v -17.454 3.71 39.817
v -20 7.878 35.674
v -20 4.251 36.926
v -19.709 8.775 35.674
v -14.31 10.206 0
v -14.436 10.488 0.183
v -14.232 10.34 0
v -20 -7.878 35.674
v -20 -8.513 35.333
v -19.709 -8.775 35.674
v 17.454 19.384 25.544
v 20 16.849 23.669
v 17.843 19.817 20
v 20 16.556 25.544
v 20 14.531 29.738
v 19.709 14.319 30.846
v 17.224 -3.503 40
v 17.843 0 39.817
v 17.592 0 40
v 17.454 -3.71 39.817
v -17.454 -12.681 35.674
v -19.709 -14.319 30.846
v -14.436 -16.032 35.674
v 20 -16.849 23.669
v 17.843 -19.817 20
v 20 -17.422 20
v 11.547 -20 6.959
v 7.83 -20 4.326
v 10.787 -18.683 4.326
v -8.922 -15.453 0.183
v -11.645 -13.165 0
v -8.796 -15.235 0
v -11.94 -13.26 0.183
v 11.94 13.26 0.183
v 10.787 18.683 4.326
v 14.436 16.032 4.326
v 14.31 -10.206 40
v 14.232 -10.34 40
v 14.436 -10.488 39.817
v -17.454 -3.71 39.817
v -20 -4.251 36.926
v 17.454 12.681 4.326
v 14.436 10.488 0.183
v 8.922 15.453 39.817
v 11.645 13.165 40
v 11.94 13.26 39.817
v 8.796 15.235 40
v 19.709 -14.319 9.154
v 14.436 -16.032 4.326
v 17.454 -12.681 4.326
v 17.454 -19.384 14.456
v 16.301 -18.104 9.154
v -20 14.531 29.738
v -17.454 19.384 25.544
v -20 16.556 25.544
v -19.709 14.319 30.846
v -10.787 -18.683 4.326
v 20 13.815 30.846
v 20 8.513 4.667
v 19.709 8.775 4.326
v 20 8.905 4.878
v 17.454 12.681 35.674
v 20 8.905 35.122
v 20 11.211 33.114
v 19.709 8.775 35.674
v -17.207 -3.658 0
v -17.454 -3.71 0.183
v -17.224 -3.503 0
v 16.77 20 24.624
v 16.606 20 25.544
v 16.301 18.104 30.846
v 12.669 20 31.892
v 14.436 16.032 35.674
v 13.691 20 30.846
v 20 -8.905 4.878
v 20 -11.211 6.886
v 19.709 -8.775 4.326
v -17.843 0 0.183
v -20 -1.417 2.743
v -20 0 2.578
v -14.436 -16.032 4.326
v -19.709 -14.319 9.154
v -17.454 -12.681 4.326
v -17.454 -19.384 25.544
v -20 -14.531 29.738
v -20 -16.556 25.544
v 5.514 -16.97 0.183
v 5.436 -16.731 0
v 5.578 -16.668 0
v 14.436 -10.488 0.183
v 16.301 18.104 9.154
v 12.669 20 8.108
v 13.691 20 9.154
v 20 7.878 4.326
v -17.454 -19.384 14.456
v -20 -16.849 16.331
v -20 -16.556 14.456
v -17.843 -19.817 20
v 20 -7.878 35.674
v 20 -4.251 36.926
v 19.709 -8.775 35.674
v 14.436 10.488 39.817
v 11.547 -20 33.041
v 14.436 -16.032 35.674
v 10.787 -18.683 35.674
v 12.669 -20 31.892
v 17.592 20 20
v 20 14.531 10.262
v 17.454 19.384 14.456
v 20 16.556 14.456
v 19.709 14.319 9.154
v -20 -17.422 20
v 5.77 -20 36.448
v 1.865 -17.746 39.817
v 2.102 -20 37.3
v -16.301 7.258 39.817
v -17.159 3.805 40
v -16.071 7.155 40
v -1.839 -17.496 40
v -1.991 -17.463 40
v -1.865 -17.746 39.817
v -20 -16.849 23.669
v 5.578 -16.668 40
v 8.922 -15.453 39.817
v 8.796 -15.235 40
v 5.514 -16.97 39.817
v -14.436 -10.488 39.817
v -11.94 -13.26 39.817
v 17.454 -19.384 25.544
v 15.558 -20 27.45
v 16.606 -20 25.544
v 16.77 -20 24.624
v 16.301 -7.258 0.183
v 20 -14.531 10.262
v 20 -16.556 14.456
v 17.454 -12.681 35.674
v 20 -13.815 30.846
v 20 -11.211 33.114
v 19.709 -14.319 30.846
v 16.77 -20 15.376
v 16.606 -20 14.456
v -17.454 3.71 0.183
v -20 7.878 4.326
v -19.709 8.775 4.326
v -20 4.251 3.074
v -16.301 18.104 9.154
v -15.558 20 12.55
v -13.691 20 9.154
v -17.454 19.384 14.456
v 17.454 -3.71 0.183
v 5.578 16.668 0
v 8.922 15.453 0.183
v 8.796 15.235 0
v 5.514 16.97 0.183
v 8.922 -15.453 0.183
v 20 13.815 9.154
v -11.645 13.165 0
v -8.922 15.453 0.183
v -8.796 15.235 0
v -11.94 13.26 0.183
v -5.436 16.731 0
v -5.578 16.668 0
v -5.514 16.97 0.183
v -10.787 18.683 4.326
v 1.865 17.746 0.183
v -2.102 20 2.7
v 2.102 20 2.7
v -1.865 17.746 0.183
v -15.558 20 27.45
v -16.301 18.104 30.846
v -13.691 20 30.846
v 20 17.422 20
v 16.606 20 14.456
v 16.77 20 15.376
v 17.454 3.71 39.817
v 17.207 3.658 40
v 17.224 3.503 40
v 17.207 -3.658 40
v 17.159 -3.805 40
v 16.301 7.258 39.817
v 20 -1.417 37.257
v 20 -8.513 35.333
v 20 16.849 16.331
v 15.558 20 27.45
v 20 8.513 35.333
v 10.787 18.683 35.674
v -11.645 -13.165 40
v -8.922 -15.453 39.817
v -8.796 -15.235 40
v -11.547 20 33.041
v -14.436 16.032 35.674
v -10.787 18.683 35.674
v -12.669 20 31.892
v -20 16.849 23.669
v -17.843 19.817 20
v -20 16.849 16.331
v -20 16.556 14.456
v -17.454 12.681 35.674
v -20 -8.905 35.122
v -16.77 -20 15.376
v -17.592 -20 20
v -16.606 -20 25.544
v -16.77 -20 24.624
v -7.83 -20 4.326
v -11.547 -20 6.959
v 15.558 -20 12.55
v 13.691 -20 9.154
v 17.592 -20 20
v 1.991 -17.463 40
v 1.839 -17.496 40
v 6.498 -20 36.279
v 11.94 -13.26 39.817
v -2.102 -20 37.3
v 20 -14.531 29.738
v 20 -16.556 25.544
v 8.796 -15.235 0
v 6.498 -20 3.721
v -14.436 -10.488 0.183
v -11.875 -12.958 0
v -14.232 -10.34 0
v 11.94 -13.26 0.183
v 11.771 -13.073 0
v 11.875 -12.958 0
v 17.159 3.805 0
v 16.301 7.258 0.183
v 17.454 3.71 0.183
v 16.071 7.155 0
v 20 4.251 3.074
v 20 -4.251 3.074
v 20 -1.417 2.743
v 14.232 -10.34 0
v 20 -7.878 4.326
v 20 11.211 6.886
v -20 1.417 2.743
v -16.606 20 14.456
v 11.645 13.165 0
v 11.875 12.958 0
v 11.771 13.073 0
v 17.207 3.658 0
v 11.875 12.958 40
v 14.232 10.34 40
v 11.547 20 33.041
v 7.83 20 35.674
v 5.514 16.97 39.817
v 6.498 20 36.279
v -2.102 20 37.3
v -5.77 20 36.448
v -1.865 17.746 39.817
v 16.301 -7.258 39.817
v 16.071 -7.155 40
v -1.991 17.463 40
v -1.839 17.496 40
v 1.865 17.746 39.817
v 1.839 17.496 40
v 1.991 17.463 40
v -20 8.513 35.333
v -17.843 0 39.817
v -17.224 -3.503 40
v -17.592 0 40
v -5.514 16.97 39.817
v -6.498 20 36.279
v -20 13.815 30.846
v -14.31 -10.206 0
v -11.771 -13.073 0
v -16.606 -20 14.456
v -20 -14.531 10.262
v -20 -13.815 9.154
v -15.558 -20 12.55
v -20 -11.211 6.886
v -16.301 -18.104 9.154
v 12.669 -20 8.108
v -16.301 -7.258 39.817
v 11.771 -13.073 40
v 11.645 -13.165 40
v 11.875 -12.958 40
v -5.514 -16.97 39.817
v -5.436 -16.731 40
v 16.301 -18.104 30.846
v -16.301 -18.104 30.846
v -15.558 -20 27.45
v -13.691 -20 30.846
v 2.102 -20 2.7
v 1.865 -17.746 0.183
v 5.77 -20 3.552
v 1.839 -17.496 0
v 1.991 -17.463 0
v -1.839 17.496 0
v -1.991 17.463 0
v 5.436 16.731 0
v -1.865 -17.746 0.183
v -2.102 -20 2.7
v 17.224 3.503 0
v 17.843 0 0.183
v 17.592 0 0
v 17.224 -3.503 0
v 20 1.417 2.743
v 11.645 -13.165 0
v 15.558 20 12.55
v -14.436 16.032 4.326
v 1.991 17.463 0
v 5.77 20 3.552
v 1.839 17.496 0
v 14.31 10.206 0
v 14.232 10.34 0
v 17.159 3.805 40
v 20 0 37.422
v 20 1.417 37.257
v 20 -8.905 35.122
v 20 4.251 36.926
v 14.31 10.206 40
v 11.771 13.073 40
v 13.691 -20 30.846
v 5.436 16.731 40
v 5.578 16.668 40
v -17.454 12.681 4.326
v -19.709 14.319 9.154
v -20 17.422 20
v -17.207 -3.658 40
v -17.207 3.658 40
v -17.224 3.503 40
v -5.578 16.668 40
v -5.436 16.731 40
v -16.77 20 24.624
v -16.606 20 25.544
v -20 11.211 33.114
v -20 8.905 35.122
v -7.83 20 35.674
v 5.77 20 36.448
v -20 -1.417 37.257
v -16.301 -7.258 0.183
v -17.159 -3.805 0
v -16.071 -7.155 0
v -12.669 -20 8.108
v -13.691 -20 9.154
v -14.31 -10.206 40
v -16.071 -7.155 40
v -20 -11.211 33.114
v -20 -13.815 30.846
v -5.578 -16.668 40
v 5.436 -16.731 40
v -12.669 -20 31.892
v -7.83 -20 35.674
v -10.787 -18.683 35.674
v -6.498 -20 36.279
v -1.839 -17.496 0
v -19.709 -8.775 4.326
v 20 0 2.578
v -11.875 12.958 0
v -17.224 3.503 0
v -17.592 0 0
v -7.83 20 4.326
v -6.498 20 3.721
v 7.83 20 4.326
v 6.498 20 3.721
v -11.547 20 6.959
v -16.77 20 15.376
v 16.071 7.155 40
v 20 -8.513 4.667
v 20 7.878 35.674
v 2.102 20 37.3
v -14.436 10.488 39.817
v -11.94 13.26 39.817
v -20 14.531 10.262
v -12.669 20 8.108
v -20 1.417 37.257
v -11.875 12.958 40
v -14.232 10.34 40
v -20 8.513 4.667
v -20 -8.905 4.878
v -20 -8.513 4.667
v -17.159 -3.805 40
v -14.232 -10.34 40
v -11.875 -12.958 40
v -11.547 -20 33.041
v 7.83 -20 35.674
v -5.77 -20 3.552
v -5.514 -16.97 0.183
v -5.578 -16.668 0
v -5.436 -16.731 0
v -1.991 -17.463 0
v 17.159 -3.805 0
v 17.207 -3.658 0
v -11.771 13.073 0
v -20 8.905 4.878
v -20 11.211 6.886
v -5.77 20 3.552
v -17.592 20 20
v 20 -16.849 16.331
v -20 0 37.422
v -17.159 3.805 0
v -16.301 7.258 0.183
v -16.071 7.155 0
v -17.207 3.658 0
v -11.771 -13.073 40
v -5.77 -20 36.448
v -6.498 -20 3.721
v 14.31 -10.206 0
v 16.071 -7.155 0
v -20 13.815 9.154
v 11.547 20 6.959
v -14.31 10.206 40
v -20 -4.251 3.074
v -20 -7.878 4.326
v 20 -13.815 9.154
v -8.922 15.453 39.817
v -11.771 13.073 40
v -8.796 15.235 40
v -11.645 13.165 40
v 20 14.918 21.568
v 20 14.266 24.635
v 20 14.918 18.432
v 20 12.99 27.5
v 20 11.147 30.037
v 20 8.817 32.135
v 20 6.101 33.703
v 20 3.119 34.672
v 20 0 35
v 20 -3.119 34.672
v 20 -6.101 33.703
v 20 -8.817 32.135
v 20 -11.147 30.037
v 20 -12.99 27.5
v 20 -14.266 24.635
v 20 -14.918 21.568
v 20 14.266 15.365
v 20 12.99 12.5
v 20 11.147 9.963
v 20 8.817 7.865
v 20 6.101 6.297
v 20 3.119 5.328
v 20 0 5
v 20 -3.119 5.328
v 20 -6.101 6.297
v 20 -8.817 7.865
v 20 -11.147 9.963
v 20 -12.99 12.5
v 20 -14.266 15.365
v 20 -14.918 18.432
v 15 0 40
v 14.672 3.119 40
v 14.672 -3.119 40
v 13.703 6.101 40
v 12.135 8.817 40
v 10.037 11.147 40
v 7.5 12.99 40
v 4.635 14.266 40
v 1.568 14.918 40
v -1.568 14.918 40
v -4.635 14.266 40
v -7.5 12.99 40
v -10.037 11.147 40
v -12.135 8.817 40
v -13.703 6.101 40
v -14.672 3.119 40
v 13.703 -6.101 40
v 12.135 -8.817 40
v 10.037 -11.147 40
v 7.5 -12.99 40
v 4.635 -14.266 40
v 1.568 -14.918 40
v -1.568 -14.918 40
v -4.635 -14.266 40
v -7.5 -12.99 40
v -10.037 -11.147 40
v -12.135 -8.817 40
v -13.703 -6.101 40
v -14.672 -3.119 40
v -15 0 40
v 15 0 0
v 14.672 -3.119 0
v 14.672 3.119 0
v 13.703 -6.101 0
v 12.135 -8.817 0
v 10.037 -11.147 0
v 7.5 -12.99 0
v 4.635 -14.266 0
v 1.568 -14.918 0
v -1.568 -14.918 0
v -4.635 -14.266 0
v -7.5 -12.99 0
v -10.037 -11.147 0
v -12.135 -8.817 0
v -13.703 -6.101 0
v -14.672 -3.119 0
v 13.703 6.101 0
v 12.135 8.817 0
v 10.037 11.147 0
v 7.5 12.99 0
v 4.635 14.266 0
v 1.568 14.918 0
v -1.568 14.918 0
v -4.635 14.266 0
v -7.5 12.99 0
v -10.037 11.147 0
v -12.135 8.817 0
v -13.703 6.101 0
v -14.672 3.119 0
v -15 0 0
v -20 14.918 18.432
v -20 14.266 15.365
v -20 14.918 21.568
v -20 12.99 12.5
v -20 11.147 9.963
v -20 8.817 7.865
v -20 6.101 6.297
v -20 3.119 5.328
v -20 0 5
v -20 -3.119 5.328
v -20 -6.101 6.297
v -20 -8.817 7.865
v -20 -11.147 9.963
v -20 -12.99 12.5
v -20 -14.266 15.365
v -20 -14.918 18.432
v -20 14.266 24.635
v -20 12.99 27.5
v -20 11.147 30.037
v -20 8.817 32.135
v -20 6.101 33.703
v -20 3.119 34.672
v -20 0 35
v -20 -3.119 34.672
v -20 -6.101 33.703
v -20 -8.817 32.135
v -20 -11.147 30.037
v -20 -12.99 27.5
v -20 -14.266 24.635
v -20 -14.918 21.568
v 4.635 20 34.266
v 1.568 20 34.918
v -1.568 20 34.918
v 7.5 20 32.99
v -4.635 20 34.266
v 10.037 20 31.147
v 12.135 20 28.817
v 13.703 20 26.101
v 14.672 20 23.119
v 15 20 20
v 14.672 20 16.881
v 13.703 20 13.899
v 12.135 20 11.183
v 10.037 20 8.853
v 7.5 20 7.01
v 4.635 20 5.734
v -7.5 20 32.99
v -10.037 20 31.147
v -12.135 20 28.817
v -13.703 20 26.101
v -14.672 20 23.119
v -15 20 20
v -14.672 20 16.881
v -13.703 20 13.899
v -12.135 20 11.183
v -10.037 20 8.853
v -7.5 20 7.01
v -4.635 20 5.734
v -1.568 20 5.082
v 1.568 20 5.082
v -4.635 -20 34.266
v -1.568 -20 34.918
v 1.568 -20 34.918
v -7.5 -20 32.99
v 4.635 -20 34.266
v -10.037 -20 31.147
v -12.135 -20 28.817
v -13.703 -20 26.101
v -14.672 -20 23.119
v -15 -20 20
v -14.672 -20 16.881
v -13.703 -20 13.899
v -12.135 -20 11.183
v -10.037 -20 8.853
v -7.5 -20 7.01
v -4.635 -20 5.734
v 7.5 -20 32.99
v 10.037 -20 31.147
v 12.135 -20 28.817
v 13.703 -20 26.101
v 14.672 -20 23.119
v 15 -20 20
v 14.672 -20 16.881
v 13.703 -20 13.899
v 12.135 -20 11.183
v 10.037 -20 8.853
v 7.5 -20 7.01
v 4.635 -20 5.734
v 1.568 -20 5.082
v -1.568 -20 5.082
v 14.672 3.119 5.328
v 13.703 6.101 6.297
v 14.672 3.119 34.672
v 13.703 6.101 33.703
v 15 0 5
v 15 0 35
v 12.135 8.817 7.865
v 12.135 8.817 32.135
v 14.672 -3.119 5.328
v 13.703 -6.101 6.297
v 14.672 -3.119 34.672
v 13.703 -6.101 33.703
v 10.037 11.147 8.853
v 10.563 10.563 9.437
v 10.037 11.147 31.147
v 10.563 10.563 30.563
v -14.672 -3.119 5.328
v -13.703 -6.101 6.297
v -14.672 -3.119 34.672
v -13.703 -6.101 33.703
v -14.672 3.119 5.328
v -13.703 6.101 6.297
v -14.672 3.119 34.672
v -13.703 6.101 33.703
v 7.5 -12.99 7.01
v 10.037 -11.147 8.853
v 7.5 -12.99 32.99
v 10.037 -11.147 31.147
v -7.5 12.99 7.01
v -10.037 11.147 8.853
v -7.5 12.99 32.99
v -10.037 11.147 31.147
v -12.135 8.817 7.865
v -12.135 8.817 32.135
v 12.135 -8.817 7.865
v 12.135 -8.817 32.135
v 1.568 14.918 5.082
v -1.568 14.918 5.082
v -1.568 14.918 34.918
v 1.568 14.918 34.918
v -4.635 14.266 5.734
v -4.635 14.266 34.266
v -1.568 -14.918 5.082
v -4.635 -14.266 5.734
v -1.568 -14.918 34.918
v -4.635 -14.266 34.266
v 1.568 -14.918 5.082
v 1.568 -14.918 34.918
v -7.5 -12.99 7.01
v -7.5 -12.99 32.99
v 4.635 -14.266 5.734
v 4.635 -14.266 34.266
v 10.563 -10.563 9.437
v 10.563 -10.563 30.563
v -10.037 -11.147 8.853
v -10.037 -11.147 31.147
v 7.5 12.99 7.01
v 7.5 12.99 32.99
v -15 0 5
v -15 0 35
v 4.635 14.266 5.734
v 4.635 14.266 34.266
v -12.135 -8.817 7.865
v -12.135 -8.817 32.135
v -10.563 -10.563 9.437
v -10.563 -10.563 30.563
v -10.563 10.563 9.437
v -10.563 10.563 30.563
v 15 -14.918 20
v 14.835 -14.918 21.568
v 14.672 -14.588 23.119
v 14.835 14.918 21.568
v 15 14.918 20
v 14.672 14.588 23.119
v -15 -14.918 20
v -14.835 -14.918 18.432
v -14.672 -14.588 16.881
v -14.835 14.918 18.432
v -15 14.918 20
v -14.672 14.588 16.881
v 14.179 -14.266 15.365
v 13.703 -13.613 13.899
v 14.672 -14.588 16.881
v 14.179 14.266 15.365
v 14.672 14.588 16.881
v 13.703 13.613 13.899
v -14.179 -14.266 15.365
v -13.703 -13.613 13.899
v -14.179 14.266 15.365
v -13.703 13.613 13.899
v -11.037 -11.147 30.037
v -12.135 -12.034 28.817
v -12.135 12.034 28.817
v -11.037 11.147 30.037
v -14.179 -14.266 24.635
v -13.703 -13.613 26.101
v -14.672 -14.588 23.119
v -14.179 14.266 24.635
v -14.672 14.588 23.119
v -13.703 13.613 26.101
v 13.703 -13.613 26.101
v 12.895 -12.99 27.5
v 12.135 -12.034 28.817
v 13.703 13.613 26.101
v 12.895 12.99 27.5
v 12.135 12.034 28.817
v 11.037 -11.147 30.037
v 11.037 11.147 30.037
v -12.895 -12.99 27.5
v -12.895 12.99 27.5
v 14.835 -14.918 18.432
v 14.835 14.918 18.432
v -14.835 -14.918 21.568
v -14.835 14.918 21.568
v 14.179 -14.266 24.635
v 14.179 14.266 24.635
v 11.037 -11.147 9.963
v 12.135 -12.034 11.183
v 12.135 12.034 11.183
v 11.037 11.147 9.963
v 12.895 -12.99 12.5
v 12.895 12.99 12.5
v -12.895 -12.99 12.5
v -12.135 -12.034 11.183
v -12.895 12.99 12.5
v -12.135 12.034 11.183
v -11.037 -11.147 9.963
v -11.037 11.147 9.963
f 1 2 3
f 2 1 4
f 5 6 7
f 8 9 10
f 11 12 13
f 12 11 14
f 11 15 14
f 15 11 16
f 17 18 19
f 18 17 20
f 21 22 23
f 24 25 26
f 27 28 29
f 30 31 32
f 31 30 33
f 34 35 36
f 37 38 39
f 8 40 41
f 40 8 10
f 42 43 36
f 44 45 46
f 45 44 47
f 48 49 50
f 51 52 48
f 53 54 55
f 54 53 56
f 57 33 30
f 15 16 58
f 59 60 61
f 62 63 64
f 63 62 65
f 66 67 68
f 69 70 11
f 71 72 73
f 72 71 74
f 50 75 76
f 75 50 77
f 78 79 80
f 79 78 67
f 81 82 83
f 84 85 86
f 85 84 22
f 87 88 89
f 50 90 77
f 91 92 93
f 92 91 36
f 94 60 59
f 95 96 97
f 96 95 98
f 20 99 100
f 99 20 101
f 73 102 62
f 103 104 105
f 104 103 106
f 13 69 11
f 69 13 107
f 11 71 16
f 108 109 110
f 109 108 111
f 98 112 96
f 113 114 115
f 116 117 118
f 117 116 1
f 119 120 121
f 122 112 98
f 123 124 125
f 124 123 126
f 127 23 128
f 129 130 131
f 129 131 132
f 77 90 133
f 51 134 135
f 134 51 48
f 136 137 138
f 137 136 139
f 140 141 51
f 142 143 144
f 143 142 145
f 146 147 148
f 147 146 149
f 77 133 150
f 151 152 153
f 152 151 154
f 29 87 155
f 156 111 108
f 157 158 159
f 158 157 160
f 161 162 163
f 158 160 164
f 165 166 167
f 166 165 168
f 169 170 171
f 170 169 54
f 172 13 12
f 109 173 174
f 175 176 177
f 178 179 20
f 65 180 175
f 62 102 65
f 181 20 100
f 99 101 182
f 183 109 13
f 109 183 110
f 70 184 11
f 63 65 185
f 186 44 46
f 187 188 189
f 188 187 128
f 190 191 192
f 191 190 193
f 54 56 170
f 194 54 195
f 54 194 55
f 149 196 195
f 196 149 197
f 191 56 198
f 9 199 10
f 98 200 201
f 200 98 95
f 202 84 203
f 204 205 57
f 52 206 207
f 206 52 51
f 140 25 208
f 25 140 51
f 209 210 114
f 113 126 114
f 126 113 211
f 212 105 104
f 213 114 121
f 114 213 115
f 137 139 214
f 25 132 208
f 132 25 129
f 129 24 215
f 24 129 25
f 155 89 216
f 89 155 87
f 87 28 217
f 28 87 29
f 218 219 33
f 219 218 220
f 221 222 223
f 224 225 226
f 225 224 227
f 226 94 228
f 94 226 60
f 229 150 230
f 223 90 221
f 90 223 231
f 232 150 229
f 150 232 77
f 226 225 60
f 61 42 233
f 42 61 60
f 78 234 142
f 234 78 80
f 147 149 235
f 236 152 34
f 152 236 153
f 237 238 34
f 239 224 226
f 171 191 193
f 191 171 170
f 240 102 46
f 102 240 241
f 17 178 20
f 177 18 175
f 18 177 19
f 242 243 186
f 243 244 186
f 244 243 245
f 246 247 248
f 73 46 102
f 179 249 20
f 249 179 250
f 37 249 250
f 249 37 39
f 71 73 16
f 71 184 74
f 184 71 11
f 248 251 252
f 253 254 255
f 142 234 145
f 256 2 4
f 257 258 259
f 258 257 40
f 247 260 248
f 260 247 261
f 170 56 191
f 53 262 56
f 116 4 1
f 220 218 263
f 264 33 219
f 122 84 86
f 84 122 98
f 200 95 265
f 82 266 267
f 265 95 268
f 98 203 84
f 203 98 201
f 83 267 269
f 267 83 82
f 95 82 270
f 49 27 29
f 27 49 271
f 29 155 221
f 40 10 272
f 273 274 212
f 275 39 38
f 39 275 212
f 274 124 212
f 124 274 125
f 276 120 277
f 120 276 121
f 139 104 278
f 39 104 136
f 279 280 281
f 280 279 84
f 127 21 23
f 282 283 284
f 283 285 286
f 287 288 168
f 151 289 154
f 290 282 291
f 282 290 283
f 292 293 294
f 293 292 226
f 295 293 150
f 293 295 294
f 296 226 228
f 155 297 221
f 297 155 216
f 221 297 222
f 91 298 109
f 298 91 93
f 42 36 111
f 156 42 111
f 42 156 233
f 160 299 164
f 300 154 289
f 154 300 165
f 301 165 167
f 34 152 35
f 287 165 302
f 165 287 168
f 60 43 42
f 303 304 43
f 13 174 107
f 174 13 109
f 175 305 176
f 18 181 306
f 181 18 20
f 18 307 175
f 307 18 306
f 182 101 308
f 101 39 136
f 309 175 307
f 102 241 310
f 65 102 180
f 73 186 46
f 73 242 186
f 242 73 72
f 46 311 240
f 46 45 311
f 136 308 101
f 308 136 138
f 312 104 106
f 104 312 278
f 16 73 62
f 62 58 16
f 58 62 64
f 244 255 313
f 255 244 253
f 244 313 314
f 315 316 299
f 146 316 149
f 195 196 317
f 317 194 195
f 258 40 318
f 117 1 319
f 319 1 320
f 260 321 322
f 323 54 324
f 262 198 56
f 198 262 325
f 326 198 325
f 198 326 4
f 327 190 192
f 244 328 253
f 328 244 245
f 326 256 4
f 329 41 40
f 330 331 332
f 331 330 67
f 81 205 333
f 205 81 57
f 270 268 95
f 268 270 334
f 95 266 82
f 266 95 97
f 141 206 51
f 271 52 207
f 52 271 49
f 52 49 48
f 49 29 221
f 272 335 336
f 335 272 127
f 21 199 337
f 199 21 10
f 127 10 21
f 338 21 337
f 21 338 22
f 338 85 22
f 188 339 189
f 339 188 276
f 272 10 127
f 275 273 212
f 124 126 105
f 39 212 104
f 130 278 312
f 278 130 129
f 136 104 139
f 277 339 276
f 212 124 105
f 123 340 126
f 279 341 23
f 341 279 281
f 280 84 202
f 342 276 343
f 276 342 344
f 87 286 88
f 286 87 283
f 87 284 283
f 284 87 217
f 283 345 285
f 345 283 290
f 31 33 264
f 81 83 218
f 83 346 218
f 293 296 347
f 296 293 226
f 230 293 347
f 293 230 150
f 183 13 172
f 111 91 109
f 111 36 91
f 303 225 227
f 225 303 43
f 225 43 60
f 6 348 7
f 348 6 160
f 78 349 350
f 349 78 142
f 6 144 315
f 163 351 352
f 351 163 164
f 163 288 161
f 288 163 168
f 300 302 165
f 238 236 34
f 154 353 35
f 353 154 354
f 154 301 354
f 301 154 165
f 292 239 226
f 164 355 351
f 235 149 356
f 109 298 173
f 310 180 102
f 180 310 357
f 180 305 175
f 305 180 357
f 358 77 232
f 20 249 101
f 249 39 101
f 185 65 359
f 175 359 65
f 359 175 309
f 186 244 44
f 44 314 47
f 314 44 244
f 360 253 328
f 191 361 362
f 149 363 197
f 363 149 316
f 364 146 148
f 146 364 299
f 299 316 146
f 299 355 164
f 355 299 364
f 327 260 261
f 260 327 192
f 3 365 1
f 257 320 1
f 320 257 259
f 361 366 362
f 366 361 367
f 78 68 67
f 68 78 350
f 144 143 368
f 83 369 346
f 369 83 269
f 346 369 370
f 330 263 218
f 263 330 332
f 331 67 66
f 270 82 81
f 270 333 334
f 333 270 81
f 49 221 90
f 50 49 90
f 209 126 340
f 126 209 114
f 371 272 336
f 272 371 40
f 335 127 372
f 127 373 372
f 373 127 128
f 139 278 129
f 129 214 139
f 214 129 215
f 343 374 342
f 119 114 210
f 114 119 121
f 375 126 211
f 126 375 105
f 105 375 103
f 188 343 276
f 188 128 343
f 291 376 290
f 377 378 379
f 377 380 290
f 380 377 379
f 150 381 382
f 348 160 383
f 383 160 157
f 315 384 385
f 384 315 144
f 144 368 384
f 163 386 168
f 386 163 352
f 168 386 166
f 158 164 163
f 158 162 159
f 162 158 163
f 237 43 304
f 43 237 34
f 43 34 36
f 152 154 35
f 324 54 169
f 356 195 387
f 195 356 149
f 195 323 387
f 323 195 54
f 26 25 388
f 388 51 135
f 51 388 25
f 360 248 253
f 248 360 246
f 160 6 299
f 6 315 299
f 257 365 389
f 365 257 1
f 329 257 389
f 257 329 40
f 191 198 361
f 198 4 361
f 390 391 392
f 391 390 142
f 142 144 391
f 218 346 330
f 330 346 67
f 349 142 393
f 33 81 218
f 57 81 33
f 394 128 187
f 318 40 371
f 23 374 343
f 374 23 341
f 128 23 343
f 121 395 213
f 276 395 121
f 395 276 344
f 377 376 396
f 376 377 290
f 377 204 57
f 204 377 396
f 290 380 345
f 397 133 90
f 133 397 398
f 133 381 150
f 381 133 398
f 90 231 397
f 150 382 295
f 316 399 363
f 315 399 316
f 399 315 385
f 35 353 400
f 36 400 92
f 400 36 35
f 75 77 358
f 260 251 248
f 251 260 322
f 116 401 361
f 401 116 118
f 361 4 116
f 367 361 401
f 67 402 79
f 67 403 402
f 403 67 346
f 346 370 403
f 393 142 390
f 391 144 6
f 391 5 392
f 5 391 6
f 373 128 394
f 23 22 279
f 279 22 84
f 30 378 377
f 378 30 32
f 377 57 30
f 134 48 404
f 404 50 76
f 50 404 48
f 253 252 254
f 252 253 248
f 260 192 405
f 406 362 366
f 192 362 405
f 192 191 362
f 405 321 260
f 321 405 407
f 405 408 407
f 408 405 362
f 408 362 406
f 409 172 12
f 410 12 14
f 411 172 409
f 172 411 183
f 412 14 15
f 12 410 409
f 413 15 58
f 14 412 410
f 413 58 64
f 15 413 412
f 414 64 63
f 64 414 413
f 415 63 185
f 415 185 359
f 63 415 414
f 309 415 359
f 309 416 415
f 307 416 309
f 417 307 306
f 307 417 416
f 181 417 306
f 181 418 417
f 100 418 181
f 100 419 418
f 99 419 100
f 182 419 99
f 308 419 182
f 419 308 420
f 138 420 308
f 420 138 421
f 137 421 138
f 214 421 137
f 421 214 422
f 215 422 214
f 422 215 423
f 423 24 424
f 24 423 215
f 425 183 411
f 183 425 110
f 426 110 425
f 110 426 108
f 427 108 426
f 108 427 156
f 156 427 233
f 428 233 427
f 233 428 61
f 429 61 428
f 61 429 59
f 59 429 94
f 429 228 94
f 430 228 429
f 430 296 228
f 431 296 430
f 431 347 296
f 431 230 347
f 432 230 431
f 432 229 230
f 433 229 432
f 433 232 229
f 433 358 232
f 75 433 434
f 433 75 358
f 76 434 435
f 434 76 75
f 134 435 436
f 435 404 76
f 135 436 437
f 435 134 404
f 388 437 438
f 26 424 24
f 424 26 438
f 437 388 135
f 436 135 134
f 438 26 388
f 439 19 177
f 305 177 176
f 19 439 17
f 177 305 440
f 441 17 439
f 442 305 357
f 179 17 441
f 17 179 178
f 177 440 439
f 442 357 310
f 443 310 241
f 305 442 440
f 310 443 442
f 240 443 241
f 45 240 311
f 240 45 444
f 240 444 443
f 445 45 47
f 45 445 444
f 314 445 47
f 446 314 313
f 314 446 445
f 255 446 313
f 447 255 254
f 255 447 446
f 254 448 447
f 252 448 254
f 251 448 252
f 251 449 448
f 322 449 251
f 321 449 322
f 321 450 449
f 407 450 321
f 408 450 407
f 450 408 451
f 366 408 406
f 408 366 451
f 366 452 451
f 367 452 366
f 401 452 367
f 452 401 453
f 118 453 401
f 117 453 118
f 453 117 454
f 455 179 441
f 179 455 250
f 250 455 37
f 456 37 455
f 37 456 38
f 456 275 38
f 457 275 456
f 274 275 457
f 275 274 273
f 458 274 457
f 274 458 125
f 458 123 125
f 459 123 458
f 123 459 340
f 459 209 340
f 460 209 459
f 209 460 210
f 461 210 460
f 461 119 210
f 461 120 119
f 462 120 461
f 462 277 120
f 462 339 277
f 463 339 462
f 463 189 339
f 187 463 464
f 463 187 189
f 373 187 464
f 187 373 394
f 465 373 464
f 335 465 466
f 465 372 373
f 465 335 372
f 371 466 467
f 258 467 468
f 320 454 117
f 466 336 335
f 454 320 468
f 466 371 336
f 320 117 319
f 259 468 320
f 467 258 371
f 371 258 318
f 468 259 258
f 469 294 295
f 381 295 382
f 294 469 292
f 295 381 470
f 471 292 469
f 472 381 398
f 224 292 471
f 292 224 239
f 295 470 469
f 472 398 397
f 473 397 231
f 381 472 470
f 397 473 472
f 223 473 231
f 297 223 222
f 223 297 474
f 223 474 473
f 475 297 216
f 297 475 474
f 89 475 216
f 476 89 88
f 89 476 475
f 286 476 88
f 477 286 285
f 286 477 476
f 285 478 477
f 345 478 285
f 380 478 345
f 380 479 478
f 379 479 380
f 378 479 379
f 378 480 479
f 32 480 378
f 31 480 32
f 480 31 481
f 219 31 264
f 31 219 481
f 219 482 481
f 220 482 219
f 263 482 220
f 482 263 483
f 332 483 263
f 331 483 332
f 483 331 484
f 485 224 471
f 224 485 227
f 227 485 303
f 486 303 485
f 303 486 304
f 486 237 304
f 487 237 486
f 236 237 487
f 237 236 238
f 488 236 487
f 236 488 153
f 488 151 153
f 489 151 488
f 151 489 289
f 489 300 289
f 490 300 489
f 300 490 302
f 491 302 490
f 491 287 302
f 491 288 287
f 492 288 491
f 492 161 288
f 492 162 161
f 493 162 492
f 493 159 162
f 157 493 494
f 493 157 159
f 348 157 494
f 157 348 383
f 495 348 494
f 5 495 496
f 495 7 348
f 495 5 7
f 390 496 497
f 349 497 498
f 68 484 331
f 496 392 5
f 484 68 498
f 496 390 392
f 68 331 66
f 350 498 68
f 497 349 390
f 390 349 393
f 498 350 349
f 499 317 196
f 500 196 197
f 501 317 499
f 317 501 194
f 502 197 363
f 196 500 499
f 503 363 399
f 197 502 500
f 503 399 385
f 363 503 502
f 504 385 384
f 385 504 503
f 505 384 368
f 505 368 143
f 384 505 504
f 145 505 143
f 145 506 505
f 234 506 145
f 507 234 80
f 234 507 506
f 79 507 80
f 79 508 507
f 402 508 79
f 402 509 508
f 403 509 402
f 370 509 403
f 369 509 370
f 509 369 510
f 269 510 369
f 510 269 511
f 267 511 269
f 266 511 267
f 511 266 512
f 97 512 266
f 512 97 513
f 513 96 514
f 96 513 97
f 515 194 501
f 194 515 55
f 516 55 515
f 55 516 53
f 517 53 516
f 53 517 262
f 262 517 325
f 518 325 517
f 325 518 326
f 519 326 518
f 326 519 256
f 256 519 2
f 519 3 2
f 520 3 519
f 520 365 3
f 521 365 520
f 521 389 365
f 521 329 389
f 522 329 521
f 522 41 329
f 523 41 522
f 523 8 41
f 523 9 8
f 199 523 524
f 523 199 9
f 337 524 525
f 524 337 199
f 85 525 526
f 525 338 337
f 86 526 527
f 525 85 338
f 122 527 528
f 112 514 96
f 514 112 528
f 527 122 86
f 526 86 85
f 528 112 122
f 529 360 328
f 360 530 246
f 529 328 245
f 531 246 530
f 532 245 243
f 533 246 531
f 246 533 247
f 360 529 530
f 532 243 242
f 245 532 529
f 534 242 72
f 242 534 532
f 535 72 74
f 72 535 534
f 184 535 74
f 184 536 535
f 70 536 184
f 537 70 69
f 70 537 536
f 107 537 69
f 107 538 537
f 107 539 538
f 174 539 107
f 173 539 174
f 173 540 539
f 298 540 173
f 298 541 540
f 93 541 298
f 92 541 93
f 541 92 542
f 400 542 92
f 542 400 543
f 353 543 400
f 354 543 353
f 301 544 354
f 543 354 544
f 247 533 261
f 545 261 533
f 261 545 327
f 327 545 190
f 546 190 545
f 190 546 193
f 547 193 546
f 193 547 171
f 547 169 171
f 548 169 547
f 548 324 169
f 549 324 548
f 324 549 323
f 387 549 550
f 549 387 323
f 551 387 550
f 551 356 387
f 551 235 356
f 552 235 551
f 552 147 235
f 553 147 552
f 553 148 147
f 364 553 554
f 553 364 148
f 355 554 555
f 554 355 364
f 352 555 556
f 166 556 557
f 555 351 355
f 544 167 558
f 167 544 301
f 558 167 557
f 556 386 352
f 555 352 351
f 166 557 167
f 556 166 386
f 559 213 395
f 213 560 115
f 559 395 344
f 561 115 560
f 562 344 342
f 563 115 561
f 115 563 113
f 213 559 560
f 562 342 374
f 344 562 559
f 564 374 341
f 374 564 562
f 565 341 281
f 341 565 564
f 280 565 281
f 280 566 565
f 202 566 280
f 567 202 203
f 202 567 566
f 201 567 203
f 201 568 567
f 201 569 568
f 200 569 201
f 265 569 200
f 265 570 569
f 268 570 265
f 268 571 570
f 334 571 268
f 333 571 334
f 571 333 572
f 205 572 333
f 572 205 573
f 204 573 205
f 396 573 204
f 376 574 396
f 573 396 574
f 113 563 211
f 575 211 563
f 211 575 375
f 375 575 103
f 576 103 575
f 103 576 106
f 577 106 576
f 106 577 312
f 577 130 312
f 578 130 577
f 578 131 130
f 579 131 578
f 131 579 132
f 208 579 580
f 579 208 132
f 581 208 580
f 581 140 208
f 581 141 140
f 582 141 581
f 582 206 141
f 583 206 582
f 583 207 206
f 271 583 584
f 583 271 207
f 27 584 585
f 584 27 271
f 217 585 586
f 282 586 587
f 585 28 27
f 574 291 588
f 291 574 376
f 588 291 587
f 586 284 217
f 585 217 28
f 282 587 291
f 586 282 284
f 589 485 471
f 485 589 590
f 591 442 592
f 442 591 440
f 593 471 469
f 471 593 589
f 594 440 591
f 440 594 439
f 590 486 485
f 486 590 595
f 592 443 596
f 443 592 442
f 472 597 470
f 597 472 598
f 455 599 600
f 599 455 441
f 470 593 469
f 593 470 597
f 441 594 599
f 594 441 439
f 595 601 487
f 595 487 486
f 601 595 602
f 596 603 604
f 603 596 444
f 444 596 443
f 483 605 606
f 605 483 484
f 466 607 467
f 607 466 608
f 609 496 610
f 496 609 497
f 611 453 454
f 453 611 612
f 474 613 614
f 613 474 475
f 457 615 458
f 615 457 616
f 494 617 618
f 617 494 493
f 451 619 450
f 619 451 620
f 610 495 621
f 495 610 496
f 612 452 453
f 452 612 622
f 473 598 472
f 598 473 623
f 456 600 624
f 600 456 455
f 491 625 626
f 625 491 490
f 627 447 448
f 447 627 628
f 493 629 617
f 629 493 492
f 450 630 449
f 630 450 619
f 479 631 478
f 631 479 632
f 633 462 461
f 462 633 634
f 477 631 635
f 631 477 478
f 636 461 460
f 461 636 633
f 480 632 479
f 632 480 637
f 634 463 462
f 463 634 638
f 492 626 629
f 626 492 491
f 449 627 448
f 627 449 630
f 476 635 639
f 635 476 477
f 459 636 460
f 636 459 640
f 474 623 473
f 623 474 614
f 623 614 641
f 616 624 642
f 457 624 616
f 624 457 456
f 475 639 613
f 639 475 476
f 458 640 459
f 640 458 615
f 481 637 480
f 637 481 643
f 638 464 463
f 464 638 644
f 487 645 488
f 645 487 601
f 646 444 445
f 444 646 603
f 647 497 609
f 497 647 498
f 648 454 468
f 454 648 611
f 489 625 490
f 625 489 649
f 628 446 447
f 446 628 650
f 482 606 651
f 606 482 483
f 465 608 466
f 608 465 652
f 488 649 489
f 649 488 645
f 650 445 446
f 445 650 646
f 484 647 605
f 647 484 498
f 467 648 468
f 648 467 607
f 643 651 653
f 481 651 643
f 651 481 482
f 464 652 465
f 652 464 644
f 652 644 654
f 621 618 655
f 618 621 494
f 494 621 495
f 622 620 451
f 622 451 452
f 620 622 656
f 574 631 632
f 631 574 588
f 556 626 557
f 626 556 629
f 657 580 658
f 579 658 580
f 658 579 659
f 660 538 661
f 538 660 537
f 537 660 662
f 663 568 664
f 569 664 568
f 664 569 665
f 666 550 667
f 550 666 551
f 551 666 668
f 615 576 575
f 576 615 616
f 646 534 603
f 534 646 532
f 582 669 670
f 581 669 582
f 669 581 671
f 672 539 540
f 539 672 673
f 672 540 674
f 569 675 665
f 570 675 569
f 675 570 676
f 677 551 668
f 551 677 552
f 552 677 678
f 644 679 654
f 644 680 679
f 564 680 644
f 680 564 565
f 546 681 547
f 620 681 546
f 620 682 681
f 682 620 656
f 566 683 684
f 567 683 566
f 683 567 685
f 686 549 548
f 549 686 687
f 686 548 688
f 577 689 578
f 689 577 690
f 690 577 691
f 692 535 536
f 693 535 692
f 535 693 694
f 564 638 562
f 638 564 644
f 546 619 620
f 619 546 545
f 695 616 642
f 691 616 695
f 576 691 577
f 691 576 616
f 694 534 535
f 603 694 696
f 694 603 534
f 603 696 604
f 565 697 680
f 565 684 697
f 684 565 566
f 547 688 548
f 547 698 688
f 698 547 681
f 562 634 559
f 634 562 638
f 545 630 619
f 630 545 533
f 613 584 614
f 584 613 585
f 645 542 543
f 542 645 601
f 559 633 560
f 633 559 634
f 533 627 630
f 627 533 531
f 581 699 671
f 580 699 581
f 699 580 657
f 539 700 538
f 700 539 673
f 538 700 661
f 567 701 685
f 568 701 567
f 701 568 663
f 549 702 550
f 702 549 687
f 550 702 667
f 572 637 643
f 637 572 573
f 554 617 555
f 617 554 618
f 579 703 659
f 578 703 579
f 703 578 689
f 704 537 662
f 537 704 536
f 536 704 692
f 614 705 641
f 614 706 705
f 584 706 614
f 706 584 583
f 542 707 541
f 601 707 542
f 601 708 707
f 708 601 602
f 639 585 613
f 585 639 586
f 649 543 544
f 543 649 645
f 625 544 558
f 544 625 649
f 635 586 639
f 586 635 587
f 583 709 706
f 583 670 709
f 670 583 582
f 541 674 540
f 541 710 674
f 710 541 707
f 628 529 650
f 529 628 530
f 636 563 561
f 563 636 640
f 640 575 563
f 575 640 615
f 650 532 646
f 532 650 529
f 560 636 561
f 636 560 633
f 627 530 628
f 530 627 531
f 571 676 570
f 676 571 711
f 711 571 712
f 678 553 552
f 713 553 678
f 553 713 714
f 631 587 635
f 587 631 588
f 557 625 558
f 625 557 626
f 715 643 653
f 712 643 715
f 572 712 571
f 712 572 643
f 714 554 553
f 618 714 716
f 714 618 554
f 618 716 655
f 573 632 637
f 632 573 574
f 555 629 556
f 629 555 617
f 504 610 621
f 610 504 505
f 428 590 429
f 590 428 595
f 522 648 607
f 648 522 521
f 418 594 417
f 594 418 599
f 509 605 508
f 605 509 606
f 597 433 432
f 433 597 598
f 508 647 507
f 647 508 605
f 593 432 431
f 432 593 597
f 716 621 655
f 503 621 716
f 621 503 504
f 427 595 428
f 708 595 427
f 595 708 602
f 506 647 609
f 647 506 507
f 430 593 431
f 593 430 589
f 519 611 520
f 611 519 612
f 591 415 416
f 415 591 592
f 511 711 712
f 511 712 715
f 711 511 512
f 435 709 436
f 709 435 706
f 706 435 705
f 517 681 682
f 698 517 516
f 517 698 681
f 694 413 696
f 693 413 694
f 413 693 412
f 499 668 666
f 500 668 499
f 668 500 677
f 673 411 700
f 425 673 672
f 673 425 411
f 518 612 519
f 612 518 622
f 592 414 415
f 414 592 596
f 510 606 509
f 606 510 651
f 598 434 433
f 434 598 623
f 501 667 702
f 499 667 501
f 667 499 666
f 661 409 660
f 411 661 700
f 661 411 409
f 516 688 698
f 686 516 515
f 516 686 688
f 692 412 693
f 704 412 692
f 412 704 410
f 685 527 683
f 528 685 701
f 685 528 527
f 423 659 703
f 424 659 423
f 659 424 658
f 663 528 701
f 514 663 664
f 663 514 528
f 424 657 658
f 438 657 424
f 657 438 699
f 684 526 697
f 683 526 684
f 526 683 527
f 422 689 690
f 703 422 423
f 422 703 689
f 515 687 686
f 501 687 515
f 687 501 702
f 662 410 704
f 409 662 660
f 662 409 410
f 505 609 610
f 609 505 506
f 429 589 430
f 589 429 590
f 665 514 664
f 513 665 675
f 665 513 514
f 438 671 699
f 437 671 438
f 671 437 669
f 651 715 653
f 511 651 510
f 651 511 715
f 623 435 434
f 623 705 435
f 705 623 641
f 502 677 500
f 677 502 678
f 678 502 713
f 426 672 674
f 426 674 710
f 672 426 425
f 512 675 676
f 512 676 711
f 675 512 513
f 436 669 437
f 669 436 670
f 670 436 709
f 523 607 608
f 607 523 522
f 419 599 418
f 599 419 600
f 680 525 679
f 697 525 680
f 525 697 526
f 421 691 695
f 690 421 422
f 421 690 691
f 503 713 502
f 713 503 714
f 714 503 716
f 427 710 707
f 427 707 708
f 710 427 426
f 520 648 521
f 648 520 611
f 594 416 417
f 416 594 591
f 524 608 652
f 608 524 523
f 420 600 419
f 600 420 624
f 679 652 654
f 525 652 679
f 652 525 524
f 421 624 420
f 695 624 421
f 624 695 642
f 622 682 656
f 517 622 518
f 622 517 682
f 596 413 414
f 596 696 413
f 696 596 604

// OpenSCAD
squobe_size = 20; // [5:100]
//if squobe is not visible, lower hole size
hole_size = 15; // [5:100]

build_plate_selector = 0; //[0:Replicator 2,1: Replicator,2:Thingomatic,3:Manual]
build_plate_manual_x = 100; //[100:400]
build_plate_manual_y = 100; //[100:400]
//
build_plate(build_plate_selector,build_plate_manual_x,build_plate_manual_y);
//



module build_plate(bp,manX,manY){

		translate([0,0,-.52]){
			if(bp == 0){
				%cube([285,153,1],center = true);
			}
			if(bp == 1){
				%cube([225,145,1],center = true);
			}
			if(bp == 2){
				%cube([120,120,1],center = true);
			}
			if(bp == 3){
				%cube([manX,manY,1],center = true);
			}
		
		}
		translate([0,0,-.5]){
			if(bp == 0){
				for(i = [-14:14]){
					translate([i*10,0,0])
					%cube([.5,153,1.01],center = true);
				}
				for(i = [-7:7]){
					translate([0,i*10,0])
					%cube([285,.5,1.01],center = true);
				}	
			}
			if(bp == 1){
				for(i = [-11:11]){
					translate([i*10,0,0])
						%cube([.5,145,1.01],center = true);
				}
				for(i = [-7:7]){
					translate([0,i*10,0])
						%cube([225,.5,1.01],center = true);
				}
			}
			if(bp == 2){
				for(i = [-6:6]){
					translate([i*10,0,0])
						%cube([.5,120,1.01],center = true);
				}
				for(i = [-6:6]){
					translate([0,i*10,0])
						%cube([120,.5,1.01],center = true);
				}
			}
			if(bp == 3){
				for(i = [-(floor(manX/20)):floor(manX/20)]){
					translate([i*10,0,0])
						%cube([.5,manY,1.01],center = true);
				}
				for(i = [-(floor(manY/20)):floor(manY/20)]){
					translate([0,i*10,0])
						%cube([manX,.5,1.01],center = true);
				}
			}
		}
}


cSize = squobe_size * 2;
sSize =(2/3)* cSize;
cyLength = cSize + 20;
x = hole_size;

translate([0,0,squobe_size])
{
difference()
{
intersection()
{
color([0,0,1,]) sphere(r=sSize);
color ([.909,.439,.368]) cube([cSize,cSize,cSize],center=true);
}


color ([0,1,0]) cylinder(cyLength,x,x,center=true);


rotate([90,0,0])
color ([0,1,0]) cylinder(cyLength,x,x,center=true);


rotate([0,90,0])
color ([0,1,0]) cylinder(cyLength,x,x,center=true);
}
}
